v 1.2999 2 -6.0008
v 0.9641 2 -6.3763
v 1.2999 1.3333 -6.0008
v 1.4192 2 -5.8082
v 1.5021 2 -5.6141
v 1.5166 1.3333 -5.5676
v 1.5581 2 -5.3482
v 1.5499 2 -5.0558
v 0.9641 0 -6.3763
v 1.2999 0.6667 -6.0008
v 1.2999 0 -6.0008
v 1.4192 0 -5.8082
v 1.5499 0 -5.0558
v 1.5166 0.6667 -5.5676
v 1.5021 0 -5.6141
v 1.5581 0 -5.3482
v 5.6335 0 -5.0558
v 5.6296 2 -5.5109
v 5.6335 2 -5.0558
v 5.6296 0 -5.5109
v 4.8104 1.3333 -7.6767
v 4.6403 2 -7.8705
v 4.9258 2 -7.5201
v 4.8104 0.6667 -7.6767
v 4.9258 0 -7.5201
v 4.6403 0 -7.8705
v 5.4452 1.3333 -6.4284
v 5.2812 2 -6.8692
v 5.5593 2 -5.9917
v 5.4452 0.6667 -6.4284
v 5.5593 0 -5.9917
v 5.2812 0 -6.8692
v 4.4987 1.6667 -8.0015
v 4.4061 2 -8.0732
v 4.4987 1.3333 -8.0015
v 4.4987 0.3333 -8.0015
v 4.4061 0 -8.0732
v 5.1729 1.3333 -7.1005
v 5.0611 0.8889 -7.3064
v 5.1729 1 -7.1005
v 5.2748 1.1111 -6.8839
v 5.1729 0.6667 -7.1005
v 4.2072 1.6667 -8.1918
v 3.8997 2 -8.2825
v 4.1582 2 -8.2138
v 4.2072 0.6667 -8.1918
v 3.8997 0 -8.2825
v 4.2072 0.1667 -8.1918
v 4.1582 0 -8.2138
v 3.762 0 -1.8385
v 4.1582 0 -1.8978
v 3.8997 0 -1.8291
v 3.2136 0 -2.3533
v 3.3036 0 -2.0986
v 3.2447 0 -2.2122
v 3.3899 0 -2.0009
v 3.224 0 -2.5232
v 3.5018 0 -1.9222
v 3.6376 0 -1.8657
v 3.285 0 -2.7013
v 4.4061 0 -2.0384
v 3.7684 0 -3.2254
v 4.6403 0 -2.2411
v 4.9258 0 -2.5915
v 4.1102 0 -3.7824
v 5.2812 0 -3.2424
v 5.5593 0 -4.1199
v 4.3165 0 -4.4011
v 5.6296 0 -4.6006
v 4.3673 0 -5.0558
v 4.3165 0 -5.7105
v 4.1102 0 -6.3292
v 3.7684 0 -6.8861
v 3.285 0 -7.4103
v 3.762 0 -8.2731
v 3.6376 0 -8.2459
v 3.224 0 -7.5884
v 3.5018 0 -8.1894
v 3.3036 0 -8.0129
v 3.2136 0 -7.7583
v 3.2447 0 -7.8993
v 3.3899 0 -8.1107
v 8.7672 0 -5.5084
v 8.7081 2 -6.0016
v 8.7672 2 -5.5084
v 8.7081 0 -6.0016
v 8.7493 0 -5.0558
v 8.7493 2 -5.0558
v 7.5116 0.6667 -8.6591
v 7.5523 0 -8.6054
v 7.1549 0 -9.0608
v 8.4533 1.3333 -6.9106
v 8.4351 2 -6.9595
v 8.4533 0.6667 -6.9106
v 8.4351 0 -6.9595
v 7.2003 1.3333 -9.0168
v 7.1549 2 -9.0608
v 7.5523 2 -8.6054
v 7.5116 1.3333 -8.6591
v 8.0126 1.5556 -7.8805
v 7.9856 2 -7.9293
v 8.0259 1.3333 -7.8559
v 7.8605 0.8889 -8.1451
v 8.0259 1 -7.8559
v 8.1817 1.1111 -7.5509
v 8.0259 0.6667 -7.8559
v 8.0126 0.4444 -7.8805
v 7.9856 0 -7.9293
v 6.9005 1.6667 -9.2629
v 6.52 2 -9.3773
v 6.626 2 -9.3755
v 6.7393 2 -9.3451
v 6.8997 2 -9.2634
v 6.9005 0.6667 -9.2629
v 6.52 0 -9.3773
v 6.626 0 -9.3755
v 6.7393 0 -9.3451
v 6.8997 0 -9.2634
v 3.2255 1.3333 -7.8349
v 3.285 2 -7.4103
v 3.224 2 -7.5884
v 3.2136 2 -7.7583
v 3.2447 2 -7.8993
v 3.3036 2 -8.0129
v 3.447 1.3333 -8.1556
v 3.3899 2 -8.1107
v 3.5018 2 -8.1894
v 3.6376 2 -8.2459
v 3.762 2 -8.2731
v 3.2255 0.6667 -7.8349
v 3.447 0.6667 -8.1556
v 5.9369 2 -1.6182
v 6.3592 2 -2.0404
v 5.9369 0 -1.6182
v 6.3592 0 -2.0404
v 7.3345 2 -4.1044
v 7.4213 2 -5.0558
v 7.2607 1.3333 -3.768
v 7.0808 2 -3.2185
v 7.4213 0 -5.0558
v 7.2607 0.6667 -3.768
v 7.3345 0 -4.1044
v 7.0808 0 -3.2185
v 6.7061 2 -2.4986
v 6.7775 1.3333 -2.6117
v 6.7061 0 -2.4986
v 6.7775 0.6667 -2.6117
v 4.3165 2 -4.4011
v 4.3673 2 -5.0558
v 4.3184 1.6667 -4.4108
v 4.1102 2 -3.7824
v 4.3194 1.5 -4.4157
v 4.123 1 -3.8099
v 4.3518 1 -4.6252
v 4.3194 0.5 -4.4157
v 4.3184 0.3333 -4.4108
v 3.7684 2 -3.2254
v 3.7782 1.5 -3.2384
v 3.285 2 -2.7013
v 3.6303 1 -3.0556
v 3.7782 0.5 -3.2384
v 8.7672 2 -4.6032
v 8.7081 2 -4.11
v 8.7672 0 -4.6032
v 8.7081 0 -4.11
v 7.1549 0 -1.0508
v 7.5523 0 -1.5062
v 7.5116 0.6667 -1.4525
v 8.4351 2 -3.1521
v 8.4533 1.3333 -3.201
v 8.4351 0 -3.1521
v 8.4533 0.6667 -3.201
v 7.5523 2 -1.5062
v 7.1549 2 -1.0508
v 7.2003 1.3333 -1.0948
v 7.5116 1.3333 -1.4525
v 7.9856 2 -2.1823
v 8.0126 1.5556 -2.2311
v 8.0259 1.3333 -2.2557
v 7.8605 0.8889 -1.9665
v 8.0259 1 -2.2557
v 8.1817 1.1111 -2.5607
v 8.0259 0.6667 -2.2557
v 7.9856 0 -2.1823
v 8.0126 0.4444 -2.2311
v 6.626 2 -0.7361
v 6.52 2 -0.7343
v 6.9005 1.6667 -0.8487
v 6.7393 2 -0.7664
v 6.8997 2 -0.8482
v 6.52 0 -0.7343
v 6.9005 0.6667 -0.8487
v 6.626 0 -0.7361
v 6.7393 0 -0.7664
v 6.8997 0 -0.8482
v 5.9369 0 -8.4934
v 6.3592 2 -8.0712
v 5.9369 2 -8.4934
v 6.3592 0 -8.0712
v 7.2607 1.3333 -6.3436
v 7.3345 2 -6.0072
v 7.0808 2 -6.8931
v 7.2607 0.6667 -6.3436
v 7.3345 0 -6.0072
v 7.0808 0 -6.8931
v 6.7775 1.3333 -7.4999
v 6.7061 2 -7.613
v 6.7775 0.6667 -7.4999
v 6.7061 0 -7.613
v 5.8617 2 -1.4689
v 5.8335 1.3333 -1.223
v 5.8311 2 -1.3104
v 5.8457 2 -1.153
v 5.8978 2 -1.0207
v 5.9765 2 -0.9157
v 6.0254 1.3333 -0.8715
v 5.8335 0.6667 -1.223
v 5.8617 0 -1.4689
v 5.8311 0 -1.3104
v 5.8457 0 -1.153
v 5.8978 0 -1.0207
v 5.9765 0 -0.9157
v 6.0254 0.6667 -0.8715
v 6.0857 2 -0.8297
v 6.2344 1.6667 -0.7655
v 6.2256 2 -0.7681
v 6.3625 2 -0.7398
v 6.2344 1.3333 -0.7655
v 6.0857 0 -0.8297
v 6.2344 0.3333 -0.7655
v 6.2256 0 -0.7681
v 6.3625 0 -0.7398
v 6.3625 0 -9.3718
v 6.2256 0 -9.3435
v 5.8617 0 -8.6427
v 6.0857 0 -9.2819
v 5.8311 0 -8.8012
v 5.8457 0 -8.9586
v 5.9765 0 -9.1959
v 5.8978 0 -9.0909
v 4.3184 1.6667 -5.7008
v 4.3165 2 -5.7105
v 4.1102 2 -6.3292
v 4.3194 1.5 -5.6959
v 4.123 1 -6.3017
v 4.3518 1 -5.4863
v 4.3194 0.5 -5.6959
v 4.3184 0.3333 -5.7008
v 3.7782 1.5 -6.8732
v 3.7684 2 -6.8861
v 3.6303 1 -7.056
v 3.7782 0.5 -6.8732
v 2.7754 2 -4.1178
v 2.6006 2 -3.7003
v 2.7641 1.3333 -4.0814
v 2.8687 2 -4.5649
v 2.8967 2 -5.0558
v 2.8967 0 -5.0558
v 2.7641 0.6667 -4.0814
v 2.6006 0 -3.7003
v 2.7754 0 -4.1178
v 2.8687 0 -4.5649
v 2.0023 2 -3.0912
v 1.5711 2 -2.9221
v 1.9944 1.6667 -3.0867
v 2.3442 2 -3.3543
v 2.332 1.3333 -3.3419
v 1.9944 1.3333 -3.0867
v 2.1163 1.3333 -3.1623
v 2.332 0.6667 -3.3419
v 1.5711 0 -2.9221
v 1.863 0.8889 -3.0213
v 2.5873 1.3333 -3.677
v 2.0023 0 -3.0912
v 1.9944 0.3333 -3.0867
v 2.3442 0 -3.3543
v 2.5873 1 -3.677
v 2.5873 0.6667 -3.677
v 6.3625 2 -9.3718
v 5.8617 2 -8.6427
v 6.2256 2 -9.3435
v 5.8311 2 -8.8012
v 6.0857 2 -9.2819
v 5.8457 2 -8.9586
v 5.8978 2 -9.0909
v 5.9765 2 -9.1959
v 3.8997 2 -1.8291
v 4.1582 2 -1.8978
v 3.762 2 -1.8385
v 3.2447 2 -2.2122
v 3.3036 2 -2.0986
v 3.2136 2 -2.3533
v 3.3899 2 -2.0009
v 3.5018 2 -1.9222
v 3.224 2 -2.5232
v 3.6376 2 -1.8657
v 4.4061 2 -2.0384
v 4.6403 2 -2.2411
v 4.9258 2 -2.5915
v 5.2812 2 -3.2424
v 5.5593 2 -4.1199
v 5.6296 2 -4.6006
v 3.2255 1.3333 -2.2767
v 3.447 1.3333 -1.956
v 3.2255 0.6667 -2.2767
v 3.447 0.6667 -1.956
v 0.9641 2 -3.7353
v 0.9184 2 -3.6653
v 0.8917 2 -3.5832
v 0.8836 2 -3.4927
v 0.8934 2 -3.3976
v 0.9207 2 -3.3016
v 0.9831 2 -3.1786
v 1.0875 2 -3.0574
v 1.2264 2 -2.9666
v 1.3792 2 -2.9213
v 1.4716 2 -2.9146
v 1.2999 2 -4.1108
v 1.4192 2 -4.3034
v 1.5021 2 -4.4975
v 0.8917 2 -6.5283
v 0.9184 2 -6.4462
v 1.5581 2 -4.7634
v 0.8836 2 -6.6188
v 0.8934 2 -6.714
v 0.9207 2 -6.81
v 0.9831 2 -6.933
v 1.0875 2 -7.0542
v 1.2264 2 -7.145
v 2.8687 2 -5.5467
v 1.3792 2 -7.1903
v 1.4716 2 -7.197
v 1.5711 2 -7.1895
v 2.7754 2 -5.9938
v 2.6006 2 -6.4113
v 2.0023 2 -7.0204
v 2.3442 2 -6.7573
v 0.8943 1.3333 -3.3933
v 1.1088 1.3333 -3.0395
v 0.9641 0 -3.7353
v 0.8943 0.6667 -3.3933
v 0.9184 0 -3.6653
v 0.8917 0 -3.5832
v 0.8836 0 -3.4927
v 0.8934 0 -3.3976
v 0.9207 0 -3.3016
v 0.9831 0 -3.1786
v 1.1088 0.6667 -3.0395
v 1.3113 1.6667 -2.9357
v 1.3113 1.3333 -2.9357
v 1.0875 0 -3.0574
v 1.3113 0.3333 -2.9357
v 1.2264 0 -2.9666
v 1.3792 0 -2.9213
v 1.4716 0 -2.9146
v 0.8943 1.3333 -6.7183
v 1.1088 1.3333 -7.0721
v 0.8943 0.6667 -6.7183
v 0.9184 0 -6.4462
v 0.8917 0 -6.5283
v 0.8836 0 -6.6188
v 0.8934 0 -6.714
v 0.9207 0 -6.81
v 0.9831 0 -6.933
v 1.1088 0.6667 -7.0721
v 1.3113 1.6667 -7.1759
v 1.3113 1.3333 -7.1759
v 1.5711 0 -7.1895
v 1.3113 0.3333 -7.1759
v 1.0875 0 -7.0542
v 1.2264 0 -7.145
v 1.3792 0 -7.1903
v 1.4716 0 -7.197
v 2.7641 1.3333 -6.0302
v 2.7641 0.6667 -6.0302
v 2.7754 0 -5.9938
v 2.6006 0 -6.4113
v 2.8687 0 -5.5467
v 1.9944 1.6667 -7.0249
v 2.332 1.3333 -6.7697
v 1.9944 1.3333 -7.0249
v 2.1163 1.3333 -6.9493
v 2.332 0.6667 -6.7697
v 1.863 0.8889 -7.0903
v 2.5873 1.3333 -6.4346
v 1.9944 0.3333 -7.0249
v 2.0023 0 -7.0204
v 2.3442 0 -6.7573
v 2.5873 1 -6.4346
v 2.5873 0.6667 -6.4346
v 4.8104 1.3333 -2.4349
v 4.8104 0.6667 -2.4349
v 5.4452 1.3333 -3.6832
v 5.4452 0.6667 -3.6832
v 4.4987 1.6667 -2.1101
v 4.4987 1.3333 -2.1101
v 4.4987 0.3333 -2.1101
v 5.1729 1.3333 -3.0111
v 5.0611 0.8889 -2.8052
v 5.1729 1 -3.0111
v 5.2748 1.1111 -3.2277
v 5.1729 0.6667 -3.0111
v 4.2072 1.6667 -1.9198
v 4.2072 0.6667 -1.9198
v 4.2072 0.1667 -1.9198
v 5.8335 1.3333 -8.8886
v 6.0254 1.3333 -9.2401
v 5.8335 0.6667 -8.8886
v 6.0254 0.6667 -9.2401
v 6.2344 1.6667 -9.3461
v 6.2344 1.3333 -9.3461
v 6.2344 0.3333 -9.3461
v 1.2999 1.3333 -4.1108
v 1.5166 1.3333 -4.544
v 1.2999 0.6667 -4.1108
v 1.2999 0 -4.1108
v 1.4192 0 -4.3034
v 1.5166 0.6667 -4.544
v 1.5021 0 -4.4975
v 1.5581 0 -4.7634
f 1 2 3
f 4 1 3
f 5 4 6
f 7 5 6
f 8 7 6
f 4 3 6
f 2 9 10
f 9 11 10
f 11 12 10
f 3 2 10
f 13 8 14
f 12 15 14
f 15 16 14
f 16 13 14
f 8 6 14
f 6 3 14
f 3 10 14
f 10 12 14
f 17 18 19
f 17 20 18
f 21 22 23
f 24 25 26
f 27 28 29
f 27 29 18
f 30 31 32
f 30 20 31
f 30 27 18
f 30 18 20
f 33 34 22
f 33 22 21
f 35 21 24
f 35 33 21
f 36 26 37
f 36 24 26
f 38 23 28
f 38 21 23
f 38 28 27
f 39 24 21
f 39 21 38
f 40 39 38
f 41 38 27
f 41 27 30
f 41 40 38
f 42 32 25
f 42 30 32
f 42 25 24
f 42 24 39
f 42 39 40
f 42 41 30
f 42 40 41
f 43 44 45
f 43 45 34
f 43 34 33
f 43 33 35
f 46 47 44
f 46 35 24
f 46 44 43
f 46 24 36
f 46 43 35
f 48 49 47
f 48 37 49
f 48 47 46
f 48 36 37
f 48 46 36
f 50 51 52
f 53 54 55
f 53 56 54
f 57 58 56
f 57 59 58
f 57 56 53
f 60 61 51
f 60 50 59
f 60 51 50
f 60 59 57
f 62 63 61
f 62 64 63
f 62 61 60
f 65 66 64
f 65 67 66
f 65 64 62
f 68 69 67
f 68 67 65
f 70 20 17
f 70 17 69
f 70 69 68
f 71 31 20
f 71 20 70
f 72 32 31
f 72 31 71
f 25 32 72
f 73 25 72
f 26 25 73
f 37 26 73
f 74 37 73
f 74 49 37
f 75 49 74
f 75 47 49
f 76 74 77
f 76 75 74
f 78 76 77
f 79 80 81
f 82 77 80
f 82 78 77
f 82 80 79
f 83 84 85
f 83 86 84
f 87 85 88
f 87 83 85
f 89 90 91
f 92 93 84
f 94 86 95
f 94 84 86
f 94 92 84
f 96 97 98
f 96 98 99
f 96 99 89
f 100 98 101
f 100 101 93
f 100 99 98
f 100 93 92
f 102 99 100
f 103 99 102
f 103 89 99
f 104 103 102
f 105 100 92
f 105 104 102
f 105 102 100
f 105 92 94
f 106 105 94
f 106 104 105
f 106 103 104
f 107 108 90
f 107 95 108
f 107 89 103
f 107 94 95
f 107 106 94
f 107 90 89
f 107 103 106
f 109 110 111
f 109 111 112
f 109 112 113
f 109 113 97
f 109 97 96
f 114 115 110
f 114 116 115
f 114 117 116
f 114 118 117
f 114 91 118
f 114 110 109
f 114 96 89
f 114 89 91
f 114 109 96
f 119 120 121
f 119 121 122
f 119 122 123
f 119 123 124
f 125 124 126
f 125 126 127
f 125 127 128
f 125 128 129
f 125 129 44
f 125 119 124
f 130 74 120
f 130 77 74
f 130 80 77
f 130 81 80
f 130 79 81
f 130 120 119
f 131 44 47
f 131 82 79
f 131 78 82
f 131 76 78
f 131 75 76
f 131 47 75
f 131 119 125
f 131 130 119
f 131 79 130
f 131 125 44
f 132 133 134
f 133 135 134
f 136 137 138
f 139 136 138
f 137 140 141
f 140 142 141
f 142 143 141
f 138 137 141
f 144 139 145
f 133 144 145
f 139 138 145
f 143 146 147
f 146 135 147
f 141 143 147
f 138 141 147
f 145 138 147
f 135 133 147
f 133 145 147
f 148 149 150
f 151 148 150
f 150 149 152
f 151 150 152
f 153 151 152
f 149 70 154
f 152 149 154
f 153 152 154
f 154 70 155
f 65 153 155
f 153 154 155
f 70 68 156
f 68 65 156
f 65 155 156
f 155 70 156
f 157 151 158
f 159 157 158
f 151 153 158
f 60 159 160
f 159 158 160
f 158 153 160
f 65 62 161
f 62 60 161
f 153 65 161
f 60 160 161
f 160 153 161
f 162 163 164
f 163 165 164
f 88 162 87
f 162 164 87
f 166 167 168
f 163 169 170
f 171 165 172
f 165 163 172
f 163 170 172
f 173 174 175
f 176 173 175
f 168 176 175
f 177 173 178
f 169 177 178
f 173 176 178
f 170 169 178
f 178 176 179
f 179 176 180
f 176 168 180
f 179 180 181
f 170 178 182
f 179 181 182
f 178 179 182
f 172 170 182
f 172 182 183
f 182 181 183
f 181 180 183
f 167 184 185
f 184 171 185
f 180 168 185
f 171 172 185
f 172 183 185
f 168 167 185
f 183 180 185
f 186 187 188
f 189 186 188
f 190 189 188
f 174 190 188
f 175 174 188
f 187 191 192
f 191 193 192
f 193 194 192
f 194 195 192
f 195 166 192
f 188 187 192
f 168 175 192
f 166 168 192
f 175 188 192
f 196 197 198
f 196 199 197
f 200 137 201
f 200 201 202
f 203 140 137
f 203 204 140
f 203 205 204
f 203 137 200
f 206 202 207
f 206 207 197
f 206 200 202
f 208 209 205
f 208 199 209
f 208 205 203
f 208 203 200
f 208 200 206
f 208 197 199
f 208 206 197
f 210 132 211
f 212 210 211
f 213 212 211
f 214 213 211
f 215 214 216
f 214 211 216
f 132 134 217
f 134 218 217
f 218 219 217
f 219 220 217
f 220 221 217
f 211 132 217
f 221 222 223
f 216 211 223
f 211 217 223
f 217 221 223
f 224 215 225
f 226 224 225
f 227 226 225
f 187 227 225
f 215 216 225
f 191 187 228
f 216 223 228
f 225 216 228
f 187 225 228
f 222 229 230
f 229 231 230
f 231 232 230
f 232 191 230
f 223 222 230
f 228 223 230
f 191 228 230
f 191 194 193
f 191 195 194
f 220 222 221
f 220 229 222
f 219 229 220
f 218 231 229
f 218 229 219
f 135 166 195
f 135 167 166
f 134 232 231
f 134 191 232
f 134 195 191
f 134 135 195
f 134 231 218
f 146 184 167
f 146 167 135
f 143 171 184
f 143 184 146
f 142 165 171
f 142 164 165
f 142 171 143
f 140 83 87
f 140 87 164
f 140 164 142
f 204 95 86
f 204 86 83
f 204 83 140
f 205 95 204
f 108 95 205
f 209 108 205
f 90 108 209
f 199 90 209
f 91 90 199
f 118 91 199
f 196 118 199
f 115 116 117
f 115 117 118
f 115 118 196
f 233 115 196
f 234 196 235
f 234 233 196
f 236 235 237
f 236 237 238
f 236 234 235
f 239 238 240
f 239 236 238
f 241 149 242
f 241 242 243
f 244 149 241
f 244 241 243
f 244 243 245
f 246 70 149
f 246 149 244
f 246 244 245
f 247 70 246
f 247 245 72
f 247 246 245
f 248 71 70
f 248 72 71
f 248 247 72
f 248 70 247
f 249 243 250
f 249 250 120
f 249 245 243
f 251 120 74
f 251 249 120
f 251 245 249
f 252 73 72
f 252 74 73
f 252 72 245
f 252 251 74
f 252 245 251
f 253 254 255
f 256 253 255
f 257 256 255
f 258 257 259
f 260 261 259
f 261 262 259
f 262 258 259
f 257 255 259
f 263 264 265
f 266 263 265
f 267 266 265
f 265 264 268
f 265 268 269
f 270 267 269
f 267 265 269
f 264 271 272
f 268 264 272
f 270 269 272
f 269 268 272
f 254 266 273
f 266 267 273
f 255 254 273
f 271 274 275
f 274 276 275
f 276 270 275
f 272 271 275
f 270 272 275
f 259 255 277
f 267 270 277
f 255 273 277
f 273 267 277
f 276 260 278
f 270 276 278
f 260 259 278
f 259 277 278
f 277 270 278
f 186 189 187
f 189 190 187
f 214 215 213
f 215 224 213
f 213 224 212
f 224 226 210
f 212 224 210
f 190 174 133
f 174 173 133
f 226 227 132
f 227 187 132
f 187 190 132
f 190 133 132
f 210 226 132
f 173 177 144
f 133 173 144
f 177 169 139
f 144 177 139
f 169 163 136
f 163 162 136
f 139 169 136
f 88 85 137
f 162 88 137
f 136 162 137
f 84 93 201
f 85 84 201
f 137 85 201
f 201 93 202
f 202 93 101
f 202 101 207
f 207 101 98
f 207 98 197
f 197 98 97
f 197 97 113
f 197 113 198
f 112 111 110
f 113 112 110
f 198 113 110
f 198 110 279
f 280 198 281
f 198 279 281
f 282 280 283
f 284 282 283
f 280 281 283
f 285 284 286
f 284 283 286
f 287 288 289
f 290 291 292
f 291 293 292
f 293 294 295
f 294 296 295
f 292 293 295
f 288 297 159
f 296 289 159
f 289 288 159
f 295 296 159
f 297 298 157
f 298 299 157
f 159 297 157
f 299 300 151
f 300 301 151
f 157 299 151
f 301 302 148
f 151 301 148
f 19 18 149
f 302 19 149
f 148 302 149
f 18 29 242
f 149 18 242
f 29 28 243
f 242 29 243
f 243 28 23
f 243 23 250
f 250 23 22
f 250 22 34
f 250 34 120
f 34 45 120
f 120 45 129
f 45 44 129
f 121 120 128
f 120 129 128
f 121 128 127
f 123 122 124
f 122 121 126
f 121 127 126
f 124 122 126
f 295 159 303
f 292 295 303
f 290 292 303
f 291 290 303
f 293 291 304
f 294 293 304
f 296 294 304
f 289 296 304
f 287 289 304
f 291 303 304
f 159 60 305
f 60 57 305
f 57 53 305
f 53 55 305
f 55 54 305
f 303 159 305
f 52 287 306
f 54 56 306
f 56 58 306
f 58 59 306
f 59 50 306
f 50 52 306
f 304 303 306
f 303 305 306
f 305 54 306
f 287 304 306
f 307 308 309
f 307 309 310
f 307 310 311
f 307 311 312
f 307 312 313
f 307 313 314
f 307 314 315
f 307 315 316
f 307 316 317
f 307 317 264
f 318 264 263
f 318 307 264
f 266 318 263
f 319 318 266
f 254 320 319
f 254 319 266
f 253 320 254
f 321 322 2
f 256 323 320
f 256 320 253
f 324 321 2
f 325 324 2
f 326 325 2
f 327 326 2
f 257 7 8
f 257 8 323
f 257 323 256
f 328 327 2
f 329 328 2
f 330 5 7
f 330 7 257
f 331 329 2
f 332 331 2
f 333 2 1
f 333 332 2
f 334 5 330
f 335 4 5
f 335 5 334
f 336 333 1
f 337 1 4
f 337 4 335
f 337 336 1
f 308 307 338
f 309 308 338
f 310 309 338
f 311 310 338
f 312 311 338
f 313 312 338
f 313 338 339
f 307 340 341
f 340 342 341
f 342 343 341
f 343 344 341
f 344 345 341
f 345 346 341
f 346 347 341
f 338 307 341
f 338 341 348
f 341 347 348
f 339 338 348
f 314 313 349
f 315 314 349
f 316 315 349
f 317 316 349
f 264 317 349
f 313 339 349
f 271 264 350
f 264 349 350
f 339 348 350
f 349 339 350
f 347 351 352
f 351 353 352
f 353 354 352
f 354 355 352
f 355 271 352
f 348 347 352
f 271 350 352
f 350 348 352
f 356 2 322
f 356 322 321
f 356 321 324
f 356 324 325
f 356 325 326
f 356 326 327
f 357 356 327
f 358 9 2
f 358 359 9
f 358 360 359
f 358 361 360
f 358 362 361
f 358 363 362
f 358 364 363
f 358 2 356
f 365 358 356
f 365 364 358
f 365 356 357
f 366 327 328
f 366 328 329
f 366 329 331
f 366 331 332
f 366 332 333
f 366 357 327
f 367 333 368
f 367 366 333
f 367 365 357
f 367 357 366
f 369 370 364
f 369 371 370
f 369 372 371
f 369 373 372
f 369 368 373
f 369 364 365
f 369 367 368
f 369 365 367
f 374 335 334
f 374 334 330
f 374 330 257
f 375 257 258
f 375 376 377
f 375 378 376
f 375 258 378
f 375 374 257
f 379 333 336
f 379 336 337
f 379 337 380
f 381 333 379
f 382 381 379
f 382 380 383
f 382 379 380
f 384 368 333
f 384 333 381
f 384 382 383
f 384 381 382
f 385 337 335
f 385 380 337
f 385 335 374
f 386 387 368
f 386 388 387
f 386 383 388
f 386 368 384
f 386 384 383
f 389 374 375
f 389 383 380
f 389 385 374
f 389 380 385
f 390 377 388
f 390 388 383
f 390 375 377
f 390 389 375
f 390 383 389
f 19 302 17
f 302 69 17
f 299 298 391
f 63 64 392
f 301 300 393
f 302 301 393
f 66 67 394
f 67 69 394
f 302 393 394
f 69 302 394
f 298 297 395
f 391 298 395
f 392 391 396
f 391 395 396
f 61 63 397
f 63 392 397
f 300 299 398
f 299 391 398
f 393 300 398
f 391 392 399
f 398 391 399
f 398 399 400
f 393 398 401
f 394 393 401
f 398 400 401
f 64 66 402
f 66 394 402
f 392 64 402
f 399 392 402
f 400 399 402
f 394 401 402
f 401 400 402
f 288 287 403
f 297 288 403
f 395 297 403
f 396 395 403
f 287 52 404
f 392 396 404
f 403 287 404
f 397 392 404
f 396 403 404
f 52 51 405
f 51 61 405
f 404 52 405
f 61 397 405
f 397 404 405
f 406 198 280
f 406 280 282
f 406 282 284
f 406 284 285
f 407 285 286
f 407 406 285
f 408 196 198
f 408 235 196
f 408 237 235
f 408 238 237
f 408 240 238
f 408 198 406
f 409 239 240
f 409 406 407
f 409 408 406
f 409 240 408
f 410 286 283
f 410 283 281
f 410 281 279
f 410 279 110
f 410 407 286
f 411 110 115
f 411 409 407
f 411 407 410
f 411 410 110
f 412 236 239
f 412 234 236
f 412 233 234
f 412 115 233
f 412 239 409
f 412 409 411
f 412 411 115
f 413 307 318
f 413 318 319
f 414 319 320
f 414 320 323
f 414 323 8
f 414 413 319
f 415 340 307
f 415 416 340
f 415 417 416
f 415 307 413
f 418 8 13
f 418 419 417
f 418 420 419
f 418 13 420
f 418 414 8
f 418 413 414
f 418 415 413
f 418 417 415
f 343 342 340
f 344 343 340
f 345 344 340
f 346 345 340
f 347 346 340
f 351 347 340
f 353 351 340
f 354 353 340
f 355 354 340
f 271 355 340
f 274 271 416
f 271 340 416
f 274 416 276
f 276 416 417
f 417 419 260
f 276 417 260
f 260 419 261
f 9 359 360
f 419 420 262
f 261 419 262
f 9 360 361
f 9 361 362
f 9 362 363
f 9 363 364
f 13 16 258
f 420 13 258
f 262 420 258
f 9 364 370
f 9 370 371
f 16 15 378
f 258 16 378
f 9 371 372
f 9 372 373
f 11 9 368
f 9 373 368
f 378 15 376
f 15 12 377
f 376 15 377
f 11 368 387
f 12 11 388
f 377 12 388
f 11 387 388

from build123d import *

# Parameters (mm, degrees)
BOSS_EXTRUDE1_DEPTH   = 2
BOSS_EXTRUDE1_2_DEPTH = 2
BOSS_EXTRUDE1_3_DEPTH = 2


with BuildPart() as part:
    # Sketch1 → Boss-Extrude1 (new body)
    with BuildSketch(Plane(origin=(0, 0, 0), x_dir=(1, 0, 0), z_dir=(0, 1, 0))):
        with BuildLine():
            add(Edge.make_bspline(
                [(0.964073923, 6.376306589), (1.338175084, 6.022820676), (1.629590041, 5.613727117), (1.54993416, 5.055796213)],
                knots=[0, 0, 0, 0, 1, 1, 1, 1], degree=3))
            add(Edge.make_bspline(
                [(0.964073923, 3.735285838), (1.338175084, 4.08877175), (1.629590041, 4.497865309), (1.54993416, 5.055796213)],
                knots=[0, 0, 0, 0, 1, 1, 1, 1], degree=3))
            add(Edge.make_bspline(
                [(0.964073923, 3.735285838), (0.739819165, 3.482037926), (0.997231784, 2.838444064), (1.571095534, 2.922053352)],
                knots=[0, 0, 0, 0, 1, 1, 1, 1], degree=3))
            add(Edge.make_bspline(
                [(1.571095534, 2.922053352), (2.505999389, 3.153879104), (2.904284217, 3.992159872), (2.896683391, 5.055796213)],
                knots=[0, 0, 0, 0, 1, 1, 1, 1], degree=3))
            add(Edge.make_bspline(
                [(1.571095534, 7.189539075), (2.505999389, 6.957713322), (2.904284217, 6.119432554), (2.896683391, 5.055796213)],
                knots=[0, 0, 0, 0, 1, 1, 1, 1], degree=3))
            add(Edge.make_bspline(
                [(0.964073923, 6.376306589), (0.739819165, 6.6295545), (0.997231784, 7.273148363), (1.571095534, 7.189539075)],
                knots=[0, 0, 0, 0, 1, 1, 1, 1], degree=3))
        make_face()
    extrude(amount=BOSS_EXTRUDE1_DEPTH)


with BuildPart() as body_2:
    # Sketch1 → Boss-Extrude1 2 (new body)
    with BuildSketch(Plane(origin=(0, 0, 0), x_dir=(1, 0, 0), z_dir=(0, 1, 0))):
        with BuildLine():
            add(Edge.make_bspline(
                [(4.367307585, 5.055796213), (4.419843992, 6.37031157), (3.285044149, 7.410340663)],
                knots=[0, 0, 0, 1, 1, 1], degree=2))
            add(Edge.make_bspline(
                [(3.285044149, 7.410340663), (3.068332479, 7.856898043), (3.348088621, 8.282455859), (3.899727751, 8.282455859)],
                knots=[0, 0, 0, 0, 1, 1, 1, 1], degree=3))
            add(Edge.make_bspline(
                [(3.899727751, 8.282455859), (4.891364486, 8.170814637), (5.725389356, 6.317773961), (5.633450732, 5.055796213)],
                knots=[0, 0, 0, 0, 1, 1, 1, 1], degree=3))
            add(Edge.make_bspline(
                [(3.899727751, 1.829136567), (4.891364486, 1.940777789), (5.725389356, 3.793818465), (5.633450732, 5.055796213)],
                knots=[0, 0, 0, 0, 1, 1, 1, 1], degree=3))
            add(Edge.make_bspline(
                [(3.285044149, 2.701251763), (3.068332479, 2.254694383), (3.348088621, 1.829136567), (3.899727751, 1.829136567)],
                knots=[0, 0, 0, 0, 1, 1, 1, 1], degree=3))
            add(Edge.make_bspline(
                [(4.367307585, 5.055796213), (4.419843992, 3.741280856), (3.285044149, 2.701251763)],
                knots=[0, 0, 0, 1, 1, 1], degree=2))
        make_face()
    extrude(amount=BOSS_EXTRUDE1_2_DEPTH)


with BuildPart() as body_3:
    # Sketch1 → Boss-Extrude1 3 (new body)
    with BuildSketch(Plane(origin=(0, 0, 0), x_dir=(1, 0, 0), z_dir=(0, 1, 0))):
        with BuildLine():
            add(Edge.make_bspline(
                [(7.421260062, 5.055796213), (7.410575575, 6.399058377), (6.967575118, 7.591580787), (5.936943679, 8.493377715)],
                knots=[0, 0, 0, 0, 1, 1, 1, 1], degree=3))
            add(Edge.make_bspline(
                [(5.936943679, 8.493377715), (5.688376024, 8.853549053), (5.871426312, 9.40411075), (6.520049958, 9.377264355)],
                knots=[0, 0, 0, 0, 1, 1, 1, 1], degree=3))
            add(Edge.make_bspline(
                [(6.520049958, 9.377264355), (7.33799489, 9.482259589), (8.974704126, 6.65572482), (8.749327352, 5.055796213)],
                knots=[0, 0, 0, 0, 1, 1, 1, 1], degree=3))
            add(Edge.make_bspline(
                [(6.520049958, 0.734328071), (7.33799489, 0.629332837), (8.974704126, 3.455867606), (8.749327352, 5.055796213)],
                knots=[0, 0, 0, 0, 1, 1, 1, 1], degree=3))
            add(Edge.make_bspline(
                [(5.936943679, 1.618214711), (5.688376024, 1.258043374), (5.871426312, 0.707481677), (6.520049958, 0.734328071)],
                knots=[0, 0, 0, 0, 1, 1, 1, 1], degree=3))
            add(Edge.make_bspline(
                [(7.421260062, 5.055796213), (7.410575575, 3.712534049), (6.967575118, 2.520011639), (5.936943679, 1.618214711)],
                knots=[0, 0, 0, 0, 1, 1, 1, 1], degree=3))
        make_face()
    extrude(amount=BOSS_EXTRUDE1_3_DEPTH)


solid = Compound([part.part, body_2.part, body_3.part])
